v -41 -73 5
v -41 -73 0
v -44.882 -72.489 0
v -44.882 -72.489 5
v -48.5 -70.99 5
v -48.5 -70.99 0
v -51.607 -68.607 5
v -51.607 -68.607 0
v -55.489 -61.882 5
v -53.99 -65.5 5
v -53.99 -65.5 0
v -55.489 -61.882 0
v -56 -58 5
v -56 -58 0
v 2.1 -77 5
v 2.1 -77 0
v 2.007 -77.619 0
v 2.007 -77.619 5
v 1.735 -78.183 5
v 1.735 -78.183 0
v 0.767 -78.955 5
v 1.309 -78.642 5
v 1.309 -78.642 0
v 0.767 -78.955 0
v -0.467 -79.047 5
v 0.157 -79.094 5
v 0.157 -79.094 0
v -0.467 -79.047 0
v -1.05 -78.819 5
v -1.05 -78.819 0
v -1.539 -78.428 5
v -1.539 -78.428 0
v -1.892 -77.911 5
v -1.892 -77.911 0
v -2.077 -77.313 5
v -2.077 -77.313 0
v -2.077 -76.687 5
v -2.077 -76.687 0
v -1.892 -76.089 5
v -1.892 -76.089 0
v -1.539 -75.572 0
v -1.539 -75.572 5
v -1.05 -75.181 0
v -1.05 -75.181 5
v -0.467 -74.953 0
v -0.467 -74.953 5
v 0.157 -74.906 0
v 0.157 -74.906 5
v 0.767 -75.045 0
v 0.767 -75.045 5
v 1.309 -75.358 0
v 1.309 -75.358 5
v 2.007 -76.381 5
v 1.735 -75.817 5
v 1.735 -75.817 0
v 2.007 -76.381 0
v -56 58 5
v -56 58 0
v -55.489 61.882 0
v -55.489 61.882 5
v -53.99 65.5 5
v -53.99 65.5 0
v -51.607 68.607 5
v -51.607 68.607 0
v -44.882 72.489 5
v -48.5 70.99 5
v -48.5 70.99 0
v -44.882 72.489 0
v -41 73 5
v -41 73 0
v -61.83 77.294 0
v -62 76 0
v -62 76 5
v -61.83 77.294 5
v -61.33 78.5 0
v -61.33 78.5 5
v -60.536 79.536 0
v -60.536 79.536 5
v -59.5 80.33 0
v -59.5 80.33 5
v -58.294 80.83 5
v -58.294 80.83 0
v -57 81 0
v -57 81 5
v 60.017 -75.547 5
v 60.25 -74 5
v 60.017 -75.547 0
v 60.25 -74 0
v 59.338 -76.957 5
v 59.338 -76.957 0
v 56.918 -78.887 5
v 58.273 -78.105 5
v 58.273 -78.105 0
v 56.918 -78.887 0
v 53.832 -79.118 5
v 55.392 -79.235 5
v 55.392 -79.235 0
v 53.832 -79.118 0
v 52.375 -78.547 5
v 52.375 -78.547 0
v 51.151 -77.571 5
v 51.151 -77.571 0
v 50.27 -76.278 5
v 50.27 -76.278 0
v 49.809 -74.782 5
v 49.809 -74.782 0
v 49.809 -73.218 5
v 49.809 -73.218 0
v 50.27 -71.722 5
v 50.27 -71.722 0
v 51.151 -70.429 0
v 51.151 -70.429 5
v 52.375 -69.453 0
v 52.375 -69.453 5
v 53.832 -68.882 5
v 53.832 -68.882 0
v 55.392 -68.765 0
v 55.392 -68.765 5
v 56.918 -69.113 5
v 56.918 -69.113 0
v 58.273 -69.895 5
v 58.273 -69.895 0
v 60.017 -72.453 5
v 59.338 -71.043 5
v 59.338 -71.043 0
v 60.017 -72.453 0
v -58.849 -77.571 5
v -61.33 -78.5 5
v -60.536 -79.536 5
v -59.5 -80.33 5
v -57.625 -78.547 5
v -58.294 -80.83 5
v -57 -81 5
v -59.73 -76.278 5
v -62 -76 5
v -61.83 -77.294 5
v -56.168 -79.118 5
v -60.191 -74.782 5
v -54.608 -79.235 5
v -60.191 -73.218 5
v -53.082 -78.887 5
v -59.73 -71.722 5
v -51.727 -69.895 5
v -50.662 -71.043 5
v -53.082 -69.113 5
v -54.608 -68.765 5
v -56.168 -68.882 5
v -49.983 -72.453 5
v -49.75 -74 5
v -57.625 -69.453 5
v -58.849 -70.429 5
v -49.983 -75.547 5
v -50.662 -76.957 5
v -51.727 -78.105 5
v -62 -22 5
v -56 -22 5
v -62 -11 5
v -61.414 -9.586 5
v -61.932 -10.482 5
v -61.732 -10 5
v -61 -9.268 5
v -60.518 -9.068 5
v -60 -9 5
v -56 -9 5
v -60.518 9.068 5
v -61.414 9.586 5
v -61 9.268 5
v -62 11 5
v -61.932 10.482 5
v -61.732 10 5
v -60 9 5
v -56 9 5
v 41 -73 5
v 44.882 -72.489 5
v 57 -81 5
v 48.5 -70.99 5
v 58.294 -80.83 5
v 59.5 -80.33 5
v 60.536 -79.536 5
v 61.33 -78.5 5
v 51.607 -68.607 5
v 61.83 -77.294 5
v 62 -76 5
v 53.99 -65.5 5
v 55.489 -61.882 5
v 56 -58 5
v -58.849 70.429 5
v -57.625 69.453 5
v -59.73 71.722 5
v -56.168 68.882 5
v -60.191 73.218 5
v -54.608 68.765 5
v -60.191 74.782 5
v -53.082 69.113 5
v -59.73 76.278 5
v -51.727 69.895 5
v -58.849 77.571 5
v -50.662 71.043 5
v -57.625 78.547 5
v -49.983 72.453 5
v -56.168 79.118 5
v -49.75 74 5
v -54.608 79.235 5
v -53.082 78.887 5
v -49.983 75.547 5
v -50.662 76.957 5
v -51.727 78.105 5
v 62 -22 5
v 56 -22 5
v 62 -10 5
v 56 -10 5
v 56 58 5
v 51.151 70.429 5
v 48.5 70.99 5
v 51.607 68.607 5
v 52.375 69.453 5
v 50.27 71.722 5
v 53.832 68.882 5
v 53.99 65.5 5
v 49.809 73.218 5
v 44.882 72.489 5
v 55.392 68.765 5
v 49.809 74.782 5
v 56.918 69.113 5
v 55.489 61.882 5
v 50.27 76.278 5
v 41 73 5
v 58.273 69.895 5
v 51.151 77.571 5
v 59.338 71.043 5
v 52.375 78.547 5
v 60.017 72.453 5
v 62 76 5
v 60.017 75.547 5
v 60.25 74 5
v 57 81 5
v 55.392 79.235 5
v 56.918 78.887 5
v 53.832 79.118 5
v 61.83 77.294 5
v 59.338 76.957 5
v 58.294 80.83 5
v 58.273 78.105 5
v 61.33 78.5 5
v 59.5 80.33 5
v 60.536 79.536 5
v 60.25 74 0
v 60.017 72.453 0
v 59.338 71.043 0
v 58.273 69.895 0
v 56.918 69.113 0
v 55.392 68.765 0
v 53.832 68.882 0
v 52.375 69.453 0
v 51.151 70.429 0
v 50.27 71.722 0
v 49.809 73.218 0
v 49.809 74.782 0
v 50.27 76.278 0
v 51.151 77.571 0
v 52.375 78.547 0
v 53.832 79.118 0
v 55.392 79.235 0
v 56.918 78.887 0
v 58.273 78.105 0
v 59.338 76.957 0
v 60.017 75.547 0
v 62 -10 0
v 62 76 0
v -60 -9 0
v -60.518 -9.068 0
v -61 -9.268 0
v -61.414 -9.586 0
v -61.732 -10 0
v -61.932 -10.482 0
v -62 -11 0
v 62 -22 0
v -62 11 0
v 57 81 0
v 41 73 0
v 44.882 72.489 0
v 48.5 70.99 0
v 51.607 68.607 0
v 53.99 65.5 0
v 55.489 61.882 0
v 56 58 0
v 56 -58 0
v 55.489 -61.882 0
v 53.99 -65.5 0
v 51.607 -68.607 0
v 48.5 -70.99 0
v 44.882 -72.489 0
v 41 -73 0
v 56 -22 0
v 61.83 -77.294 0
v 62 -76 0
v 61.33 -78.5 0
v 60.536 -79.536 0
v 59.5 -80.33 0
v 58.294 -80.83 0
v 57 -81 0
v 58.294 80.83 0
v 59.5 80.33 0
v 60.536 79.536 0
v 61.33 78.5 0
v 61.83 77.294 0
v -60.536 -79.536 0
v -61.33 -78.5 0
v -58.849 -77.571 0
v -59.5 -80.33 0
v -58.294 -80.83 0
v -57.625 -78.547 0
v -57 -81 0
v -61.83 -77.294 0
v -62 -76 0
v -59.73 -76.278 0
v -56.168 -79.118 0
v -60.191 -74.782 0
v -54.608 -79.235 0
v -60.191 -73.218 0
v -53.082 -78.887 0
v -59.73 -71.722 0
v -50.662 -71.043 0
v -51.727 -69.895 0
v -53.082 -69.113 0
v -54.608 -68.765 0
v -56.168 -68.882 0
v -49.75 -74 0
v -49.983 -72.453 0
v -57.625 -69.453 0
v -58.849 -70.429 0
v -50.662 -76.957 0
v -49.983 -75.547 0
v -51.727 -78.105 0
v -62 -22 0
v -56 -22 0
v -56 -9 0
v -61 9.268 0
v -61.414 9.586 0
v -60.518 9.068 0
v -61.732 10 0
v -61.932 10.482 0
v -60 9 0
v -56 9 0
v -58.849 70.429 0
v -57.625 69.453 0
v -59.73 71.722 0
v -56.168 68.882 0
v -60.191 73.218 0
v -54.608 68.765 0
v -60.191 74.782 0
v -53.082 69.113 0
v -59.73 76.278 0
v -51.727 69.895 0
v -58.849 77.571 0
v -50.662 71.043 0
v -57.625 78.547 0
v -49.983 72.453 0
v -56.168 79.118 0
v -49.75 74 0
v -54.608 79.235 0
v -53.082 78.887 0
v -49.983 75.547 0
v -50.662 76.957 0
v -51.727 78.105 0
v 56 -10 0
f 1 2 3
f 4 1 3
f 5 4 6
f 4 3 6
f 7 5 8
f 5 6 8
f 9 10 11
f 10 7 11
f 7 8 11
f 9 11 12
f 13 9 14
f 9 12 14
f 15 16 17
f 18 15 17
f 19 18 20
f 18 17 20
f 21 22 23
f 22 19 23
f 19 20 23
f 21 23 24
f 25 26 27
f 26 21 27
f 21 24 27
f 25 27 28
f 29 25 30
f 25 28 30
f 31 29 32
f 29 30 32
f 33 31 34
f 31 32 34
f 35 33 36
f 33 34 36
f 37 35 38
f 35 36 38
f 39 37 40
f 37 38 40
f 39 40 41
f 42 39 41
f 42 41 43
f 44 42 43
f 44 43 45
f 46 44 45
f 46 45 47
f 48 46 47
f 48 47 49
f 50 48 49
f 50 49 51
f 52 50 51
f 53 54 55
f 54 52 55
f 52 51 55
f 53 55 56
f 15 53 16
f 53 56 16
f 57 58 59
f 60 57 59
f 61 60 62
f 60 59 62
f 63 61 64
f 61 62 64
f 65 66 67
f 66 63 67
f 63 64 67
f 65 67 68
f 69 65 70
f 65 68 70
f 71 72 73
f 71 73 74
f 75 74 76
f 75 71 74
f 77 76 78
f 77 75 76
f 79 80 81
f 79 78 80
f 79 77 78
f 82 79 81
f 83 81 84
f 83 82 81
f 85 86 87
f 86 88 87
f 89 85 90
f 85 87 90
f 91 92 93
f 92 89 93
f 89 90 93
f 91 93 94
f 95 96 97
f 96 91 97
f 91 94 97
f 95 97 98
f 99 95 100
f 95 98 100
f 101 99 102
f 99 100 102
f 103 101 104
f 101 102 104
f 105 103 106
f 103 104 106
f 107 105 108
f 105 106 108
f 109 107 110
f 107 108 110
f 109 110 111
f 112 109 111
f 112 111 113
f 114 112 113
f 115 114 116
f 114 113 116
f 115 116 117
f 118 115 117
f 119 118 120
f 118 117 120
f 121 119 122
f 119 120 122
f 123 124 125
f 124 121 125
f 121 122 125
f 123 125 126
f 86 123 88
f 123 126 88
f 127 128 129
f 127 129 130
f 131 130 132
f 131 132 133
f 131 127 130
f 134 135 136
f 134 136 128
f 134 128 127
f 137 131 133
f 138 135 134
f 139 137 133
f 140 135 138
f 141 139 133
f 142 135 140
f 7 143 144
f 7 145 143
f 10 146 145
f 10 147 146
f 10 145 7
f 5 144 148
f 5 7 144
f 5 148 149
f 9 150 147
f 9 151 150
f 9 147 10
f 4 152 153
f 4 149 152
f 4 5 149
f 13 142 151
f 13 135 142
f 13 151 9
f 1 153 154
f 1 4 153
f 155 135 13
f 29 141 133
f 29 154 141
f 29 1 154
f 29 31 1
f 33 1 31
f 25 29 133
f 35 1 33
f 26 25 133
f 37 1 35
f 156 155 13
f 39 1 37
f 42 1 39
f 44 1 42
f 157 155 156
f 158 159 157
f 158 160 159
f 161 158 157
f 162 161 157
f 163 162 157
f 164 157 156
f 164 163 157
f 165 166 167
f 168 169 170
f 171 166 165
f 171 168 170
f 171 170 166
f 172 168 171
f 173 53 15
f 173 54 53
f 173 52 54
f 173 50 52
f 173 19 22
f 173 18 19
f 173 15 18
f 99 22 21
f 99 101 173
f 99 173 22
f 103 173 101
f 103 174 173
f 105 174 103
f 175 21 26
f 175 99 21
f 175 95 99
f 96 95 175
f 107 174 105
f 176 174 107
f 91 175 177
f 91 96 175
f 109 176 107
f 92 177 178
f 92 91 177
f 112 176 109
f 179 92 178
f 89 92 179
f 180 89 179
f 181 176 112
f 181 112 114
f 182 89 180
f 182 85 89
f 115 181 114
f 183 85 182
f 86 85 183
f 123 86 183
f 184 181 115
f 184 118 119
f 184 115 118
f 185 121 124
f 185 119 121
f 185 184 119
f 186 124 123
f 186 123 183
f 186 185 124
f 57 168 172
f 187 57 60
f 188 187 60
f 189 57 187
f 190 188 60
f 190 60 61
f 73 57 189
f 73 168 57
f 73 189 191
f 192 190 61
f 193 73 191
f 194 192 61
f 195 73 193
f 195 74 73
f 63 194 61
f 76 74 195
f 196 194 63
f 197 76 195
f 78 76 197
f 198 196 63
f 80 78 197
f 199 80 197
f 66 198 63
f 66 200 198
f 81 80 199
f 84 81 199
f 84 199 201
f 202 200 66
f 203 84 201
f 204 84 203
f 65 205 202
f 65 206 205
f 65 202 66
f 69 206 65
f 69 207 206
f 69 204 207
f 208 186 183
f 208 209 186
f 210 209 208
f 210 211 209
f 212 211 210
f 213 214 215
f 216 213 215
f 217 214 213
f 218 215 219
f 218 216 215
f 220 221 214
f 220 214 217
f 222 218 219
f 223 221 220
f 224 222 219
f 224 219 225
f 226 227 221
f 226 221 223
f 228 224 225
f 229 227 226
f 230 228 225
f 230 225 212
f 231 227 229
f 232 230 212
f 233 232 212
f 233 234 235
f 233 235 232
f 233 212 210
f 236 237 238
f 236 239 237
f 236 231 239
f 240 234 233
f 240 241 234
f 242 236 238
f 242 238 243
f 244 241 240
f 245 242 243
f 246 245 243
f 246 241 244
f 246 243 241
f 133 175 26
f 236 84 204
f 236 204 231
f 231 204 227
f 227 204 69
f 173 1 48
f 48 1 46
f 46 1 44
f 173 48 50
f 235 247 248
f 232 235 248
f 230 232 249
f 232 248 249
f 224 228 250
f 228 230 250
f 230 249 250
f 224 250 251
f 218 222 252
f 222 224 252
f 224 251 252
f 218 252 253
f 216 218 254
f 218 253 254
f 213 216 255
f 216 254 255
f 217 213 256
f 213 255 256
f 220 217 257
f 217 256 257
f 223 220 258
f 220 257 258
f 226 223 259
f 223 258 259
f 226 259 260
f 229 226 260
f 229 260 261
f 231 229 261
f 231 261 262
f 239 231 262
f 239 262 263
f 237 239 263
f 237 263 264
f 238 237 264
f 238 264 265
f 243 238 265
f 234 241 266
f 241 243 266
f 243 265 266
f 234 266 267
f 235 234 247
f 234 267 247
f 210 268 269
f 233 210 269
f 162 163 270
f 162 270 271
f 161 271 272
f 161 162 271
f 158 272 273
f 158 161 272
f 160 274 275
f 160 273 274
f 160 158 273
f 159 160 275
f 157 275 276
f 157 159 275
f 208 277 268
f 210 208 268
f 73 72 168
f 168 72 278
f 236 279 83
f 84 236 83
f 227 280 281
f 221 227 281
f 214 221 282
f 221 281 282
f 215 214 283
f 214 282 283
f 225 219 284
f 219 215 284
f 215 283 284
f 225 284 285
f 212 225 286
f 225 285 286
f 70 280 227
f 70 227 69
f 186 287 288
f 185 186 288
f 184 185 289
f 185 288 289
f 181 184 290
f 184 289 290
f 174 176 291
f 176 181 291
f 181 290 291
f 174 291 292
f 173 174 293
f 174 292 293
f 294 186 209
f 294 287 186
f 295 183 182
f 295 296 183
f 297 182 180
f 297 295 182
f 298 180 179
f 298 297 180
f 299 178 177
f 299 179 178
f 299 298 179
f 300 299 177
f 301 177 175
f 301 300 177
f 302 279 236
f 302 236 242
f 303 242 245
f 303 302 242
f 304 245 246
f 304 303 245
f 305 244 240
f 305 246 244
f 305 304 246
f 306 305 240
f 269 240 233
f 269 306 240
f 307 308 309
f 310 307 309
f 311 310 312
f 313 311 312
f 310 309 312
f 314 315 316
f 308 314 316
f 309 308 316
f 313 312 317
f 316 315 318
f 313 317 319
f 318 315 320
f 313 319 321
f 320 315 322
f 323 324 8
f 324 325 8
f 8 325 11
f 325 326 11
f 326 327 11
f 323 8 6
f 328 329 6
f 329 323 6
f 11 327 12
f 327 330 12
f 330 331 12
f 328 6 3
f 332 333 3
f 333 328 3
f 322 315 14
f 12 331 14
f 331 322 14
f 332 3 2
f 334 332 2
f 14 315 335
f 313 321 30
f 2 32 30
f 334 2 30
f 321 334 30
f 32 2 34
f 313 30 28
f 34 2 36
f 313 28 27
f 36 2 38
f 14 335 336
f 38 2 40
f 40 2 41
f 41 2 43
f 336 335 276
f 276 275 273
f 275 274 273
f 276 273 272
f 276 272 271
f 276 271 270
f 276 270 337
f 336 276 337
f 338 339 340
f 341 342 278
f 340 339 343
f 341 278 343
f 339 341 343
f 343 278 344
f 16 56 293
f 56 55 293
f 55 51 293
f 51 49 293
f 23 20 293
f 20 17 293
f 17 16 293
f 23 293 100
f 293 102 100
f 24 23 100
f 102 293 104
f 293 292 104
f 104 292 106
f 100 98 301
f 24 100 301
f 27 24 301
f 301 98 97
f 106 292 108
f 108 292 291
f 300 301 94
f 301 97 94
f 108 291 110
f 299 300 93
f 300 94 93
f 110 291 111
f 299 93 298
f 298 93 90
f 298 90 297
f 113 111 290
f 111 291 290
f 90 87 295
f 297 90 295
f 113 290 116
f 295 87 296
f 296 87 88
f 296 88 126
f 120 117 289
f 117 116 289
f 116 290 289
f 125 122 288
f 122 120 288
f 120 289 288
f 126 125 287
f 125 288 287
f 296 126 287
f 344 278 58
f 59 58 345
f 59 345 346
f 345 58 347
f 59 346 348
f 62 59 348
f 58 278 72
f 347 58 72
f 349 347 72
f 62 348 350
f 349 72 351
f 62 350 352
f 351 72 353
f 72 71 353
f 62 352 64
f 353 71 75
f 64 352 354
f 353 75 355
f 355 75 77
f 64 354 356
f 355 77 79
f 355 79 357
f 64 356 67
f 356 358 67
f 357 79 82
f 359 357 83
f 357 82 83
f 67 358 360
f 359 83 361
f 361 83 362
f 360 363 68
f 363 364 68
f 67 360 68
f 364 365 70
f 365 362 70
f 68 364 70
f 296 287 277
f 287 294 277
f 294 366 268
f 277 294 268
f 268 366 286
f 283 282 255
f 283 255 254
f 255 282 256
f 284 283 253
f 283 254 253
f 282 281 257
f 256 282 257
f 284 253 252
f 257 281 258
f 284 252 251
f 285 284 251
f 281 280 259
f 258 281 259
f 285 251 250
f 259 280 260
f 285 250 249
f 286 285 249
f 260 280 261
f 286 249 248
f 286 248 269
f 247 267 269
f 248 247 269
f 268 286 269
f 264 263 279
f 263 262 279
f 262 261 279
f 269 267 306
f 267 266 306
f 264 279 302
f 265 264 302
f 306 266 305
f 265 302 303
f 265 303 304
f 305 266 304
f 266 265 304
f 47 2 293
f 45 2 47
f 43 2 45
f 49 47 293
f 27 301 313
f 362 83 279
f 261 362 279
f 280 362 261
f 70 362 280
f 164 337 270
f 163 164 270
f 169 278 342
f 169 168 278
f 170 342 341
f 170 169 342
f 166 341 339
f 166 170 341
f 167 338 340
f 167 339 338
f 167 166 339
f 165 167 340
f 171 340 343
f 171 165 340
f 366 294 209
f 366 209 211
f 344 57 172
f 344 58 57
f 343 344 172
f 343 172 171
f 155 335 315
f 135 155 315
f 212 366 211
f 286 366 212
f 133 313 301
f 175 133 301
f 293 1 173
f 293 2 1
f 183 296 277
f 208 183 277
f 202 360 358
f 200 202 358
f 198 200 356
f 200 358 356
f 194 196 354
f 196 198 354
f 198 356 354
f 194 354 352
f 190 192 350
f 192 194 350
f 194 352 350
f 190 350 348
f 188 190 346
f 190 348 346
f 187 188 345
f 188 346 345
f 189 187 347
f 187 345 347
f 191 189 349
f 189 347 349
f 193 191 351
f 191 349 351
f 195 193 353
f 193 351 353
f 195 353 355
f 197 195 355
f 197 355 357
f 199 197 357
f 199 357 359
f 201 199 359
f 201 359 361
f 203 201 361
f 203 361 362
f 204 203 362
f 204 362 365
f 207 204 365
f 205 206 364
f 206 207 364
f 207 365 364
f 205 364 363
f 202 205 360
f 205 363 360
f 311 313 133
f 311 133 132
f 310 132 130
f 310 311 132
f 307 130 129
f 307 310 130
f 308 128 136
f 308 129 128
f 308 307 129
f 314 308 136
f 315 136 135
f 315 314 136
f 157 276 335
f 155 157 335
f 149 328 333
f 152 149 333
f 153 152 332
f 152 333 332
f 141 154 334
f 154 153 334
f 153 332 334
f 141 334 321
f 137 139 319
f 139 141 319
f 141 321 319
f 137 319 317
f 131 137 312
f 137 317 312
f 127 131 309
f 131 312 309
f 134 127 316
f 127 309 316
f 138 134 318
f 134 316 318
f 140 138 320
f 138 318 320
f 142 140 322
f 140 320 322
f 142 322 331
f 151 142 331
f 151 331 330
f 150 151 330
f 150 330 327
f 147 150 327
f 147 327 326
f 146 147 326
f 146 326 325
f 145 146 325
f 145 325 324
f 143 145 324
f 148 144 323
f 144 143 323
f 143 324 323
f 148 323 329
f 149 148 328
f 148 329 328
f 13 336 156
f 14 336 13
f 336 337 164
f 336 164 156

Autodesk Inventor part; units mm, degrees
ref_plane "YZ Plane" through (0, 0, 0) normal (1, 0, 0) x (0, 1, 0)
ref_plane "XZ Plane" through (0, 0, 0) normal (0, 1, 0) x (-1, 0, 0)
ref_plane "XY Plane" through (0, 0, 0) normal (0, 0, 1) x (1, 0, 0)
sketch "Sketch1" plane through (0, 0, 0) normal (0, 0, 1) x (1, 0, 0)
  line L0 (-57, -81) -> (57, -81)
  line L1 (62, -76) -> (62, -22)
  line L2 (57, 81) -> (-57, 81)
  line L3 (-62, 76) -> (-62, 9)
  line L4 (-41, -73) -> (41, -73)
  line L5 (56, -58) -> (56, -22)
  line L6 (41, 73) -> (-41, 73)
  line L7 (-56, 58) -> (-56, 9)
  arc A0 (-56, -58) -> (-41, -73) centre (-41, -58) ccw
  arc A1 (-41, 73) -> (-56, 58) centre (-41, 58) ccw
  arc A2 (56, 58) -> (41, 73) centre (41, 58) ccw
  arc A3 (41, -73) -> (56, -58) centre (41, -58) ccw
  line L8 (56, -22) -> (62, -22) construction
  line L9 (56, -10) -> (62, -10) construction
  line L10 (-56, 9) -> (-62, 9)
  line L11 (-62, -22) -> (-56, -22) construction
  line L12 (-62, -22) -> (-62, -76)
  line L13 (-62, 9) -> (-62, -9) construction
  line L14 (-56, -22) -> (-56, -58)
  line L15 (-56, 9) -> (-56, -9) construction
  line L16 (56, -22) -> (56, -10)
  line L17 (56, -10) -> (56, 58)
  line L18 (62, -22) -> (62, -10)
  line L19 (62, -10) -> (62, 76)
  arc A4 (-62, -76) -> (-57, -81) centre (-57, -76) ccw
  arc A5 (-57, 81) -> (-62, 76) centre (-57, 76) ccw
  arc A6 (62, 76) -> (57, 81) centre (57, 76) ccw
  arc A7 (57, -81) -> (62, -76) centre (57, -76) ccw
  circle A8 centre (-55, -74) radius 5.25
  line L20 (-92.4325, 0) -> (79.0499, 0) construction
  line L21 (0, -100.3717) -> (0, 120.689) construction
  circle A9 centre (-55, 74) radius 5.25
  circle A10 centre (55, -74) radius 5.25
  circle A11 centre (55, 74) radius 5.25
  line L22 (-56, -9) -> (-62, -9)
  line L23 (-62, -9) -> (-62, -22)
  line L24 (-56, -9) -> (-56, -22)
  circle A12 centre (0, -77) radius 2.1
  point P0 (0, 0)
  point P1 (-62, -81)
  point P2 (62, 81)
  point P3 (-62, 81)
  dimension "d0" = 162
  dimension "d1" = 124
  dimension "d2" = 62
  dimension "d3" = 81
  dimension "d4" = 6
  dimension "d5" = 8
  dimension "d6" = 6
  dimension "d7" = 8
  dimension "d8" = 15
  dimension "d9" = 12
  dimension "d10" = 59
  dimension "d11" = 59
  dimension "d12" = 72
  dimension "d13" = 5
  dimension "d14" = 7
  dimension "d15" = 7
  dimension "d16" = 10.5
  dimension "d19" = 72
  dimension "d21" = 4
  dimension "d22" = 4.2
extrude "Extrusion1" add sketch "Sketch1" along normal blind 5
fillet "Fillet1" radius 2 2 edges at (-62, 9, 2.5) (-62, -9, 2.5)
properties part number "Plex_Rand_untere2" material "PET Plastic"
